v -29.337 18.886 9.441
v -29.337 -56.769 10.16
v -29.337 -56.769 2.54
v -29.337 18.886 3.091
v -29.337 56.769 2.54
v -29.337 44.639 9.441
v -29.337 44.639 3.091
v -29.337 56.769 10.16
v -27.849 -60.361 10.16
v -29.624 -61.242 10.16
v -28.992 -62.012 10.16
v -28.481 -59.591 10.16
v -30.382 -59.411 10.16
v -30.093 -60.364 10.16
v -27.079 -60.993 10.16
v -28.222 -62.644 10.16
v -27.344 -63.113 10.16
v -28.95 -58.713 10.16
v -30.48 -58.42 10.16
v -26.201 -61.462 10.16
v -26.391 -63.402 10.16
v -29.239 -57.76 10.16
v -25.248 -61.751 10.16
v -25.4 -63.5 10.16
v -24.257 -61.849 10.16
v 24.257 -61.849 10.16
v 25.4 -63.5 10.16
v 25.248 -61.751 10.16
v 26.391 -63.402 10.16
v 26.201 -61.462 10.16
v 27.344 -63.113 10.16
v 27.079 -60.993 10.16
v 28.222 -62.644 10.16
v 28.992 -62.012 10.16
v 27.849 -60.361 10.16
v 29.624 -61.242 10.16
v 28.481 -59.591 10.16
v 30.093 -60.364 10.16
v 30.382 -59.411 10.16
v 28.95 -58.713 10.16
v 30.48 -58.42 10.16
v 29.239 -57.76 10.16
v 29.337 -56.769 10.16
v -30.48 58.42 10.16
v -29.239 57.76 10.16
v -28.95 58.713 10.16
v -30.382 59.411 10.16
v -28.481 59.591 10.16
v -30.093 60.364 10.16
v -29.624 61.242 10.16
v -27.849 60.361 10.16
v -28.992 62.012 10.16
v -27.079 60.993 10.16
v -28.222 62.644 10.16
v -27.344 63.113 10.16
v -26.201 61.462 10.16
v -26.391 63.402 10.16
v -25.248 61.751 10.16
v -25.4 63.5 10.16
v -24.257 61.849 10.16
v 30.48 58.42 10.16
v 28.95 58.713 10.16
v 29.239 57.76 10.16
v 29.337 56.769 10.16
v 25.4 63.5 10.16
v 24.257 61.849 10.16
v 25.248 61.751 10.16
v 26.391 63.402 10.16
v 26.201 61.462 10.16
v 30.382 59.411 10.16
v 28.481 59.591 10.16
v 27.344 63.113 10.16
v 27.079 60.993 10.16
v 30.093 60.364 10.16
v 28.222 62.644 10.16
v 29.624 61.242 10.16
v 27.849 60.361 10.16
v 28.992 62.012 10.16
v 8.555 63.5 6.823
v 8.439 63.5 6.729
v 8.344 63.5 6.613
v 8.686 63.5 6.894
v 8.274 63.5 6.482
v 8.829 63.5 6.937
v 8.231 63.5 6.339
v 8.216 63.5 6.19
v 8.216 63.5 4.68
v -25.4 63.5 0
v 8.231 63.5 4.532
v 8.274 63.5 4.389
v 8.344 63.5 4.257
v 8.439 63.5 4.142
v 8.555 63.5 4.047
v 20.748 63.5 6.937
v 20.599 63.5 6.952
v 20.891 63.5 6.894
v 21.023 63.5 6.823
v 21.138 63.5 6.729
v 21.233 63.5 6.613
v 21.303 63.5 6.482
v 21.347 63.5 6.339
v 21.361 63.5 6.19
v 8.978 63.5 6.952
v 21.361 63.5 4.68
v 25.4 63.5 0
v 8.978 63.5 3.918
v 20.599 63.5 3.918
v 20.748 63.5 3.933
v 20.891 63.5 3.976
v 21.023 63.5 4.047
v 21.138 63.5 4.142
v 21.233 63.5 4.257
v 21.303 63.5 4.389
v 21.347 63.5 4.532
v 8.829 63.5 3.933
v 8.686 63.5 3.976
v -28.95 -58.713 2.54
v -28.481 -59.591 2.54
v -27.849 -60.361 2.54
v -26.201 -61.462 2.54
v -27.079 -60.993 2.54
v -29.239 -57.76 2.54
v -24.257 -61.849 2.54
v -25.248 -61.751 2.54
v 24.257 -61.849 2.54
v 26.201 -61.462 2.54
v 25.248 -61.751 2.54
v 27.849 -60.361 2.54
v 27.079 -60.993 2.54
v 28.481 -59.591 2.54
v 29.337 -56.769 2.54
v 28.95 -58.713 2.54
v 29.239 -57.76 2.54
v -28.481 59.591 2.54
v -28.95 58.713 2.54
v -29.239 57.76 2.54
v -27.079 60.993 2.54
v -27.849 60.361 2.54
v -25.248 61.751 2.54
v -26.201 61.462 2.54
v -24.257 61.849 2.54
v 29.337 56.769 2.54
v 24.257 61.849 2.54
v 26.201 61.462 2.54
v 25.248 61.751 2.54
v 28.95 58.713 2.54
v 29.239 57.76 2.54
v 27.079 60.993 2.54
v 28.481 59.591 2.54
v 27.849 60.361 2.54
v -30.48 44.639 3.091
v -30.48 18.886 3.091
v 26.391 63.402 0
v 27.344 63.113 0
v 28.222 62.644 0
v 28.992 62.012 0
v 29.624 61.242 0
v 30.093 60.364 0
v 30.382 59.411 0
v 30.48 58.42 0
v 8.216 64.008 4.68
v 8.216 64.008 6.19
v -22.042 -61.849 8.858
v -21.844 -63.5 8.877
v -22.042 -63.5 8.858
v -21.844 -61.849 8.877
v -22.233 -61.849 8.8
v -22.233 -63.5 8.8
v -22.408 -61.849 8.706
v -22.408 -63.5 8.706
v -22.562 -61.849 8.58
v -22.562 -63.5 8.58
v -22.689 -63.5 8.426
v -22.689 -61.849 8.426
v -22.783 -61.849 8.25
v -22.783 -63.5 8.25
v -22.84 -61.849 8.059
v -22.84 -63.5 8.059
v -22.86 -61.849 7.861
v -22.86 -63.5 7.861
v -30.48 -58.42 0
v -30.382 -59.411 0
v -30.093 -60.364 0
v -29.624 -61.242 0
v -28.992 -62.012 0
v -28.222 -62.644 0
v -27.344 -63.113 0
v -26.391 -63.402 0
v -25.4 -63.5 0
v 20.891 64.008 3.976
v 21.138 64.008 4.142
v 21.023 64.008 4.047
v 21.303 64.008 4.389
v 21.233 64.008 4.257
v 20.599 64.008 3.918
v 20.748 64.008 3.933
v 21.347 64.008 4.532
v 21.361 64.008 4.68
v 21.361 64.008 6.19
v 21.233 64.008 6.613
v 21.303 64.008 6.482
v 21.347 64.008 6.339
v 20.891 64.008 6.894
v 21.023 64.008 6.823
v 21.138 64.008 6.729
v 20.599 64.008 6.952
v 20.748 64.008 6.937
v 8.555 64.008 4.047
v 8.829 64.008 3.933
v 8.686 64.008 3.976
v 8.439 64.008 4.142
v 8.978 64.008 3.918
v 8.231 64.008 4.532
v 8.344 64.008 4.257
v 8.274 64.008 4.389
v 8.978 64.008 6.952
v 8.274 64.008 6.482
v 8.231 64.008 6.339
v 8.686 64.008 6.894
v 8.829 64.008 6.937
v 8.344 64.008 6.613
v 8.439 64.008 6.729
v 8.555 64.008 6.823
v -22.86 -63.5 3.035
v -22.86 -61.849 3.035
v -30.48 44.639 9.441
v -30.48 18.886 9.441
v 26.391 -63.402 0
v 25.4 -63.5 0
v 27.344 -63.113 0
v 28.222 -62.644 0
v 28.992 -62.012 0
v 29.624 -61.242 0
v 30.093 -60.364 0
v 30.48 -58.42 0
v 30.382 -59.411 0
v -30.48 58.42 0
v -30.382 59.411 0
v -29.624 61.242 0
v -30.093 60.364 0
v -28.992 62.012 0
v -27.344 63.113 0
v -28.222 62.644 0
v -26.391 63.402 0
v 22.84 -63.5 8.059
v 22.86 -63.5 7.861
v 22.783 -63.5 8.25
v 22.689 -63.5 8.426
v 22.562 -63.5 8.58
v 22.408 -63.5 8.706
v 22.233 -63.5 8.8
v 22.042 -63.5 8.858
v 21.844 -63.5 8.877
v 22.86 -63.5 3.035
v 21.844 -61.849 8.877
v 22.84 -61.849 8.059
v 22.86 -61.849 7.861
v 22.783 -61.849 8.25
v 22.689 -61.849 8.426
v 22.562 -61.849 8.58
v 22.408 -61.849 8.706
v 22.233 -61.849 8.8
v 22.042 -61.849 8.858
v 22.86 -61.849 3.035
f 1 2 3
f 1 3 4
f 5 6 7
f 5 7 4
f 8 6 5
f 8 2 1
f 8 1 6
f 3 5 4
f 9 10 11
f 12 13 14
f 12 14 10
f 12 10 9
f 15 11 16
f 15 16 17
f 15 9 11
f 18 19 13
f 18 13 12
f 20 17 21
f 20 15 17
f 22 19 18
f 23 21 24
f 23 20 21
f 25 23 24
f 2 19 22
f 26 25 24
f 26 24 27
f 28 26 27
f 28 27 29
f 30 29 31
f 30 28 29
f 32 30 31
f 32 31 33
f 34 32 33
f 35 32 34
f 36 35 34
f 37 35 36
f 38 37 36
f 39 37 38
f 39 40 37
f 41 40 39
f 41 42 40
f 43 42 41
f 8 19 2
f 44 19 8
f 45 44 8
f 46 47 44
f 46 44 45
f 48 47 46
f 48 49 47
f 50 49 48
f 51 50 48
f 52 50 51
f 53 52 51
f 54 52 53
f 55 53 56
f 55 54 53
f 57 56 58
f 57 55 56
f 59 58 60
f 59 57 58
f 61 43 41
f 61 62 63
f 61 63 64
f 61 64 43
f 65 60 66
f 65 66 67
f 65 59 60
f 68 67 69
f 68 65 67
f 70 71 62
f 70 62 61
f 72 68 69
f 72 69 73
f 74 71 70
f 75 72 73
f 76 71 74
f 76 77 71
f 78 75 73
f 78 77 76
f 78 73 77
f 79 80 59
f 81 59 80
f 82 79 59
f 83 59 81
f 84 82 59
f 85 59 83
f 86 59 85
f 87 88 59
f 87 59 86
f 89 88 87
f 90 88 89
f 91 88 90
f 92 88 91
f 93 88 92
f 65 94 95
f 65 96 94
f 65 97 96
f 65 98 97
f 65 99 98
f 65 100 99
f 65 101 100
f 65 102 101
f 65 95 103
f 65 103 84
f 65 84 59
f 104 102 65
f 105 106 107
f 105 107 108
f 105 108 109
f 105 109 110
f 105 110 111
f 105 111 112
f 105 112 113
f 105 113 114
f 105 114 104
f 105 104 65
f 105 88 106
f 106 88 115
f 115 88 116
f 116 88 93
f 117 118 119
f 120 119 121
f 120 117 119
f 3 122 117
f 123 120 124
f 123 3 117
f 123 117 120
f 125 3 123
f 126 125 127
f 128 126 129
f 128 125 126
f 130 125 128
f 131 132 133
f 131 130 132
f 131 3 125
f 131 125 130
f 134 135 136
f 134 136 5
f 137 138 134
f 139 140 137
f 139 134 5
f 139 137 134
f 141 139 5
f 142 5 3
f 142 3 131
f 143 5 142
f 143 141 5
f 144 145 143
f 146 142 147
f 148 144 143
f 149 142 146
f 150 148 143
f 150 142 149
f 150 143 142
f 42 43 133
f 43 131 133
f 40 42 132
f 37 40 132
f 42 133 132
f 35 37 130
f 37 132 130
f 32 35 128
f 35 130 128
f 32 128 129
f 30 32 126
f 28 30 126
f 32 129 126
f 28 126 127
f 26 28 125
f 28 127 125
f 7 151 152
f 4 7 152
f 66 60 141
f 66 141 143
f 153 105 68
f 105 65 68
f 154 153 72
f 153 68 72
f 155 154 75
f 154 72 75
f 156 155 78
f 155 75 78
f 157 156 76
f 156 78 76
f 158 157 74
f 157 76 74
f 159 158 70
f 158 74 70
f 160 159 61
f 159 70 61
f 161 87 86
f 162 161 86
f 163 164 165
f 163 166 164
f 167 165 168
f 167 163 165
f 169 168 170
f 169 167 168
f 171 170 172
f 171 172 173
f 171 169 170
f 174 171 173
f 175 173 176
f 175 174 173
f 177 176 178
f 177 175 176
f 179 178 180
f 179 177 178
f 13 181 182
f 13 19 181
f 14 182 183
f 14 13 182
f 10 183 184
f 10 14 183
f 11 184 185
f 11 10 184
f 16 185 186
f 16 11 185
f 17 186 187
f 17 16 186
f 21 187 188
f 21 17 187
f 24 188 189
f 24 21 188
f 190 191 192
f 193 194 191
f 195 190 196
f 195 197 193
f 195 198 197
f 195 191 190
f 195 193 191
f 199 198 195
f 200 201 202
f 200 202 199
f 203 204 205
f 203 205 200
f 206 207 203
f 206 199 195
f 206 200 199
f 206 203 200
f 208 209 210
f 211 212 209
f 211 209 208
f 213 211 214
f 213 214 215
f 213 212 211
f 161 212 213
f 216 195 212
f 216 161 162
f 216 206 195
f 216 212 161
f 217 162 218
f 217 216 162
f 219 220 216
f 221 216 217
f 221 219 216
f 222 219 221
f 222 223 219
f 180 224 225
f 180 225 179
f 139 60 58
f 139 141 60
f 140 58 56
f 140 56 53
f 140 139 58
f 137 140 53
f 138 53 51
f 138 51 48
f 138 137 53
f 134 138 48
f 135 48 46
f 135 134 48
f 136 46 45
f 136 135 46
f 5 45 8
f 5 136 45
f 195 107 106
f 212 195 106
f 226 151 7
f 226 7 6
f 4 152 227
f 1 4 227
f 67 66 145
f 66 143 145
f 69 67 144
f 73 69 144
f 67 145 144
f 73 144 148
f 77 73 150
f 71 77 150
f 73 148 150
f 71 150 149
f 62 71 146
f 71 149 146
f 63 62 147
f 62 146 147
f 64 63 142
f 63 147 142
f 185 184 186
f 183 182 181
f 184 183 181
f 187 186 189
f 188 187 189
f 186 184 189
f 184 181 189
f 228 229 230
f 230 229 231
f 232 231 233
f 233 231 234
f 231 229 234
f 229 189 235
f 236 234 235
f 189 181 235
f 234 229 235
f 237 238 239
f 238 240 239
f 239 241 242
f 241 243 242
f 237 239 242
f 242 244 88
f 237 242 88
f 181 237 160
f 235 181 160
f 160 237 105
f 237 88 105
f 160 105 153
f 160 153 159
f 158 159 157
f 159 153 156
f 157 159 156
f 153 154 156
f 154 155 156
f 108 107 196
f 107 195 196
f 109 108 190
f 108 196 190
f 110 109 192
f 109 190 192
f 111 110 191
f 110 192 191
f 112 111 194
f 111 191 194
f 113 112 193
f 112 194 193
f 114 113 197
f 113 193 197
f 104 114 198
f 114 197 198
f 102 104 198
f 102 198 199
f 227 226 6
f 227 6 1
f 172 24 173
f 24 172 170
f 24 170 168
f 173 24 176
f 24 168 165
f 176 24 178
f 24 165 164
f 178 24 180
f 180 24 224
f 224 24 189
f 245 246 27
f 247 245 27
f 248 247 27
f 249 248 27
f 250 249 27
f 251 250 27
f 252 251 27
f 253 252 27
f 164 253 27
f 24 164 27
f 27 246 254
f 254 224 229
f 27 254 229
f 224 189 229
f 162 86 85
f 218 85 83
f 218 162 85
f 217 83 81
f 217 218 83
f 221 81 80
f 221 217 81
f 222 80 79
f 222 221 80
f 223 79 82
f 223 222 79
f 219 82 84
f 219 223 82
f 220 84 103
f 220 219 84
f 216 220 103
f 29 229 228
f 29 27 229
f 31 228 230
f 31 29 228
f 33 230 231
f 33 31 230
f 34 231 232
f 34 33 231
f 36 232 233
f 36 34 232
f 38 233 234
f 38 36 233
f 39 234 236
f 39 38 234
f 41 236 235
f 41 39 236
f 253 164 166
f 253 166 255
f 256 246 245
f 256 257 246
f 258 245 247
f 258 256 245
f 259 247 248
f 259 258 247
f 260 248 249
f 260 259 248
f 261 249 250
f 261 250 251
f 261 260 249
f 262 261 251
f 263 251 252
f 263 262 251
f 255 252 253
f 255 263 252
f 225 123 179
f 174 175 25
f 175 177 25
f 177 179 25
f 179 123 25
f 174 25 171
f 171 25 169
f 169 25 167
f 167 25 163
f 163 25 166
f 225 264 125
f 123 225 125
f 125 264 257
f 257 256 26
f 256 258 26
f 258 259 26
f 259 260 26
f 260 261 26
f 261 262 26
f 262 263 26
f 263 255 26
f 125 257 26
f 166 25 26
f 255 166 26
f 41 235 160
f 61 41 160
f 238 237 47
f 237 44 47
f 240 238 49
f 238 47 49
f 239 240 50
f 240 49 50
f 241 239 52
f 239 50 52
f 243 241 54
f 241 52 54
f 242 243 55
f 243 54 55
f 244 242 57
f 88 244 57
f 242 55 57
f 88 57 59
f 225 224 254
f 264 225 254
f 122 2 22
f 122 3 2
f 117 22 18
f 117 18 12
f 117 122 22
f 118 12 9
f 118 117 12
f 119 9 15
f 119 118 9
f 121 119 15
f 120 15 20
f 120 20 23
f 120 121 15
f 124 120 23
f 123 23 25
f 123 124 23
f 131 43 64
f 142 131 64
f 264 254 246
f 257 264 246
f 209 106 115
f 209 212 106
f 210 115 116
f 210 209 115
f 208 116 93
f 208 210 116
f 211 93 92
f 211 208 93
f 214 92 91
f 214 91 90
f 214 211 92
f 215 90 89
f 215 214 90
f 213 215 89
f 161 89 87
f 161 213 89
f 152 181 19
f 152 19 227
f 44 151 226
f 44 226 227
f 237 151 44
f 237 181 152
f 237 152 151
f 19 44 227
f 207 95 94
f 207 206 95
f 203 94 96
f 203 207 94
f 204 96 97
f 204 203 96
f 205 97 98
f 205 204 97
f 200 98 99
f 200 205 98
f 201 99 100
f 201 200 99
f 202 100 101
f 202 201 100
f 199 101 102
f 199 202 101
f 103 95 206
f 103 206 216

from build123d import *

# Parameters (mm, degrees)
F0_W      = 60.96
F0_H      = 127
F1_DEPTH  = 10.16
F2_W      = 58.674
F2_H      = 123.698
F3_DEPTH  = 7.62
F4_R      = 5.08
F5_R      = 5.08
F6_W      = 45.72
F6_H      = 5.842
F7_DEPTH  = 25.4
F8_R      = 1.016
F9_W      = 25.752777
F9_H      = 6.35
F10_DEPTH = 25.4
F11_W     = 13.145404
F11_H     = 3.033555
F12_DEPTH = 0.508
F13_R     = 0.762


with BuildPart() as f1:
    # F0 (on Top) → F1 (new body)
    with BuildSketch(Plane.XY):
        Rectangle(F0_W, F0_H)
    extrude(amount=F1_DEPTH)

    # F2 (on face) → F3 (cut)
    with BuildSketch(Plane.XY.offset(10.16)):
        Rectangle(F2_W, F2_H)
    extrude(amount=-F3_DEPTH, mode=Mode.SUBTRACT)

    # F4
    f4_edges = [f1.edges().sort_by_distance(p)[0] for p in [
        (-29.337, 61.849, 6.35),
    ]]
    fillet(f4_edges, radius=F4_R)

    # F5
    f5_edges = [f1.edges().sort_by_distance(p)[0] for p in [
        (29.337, 61.849, 6.35),
        (29.337, -61.849, 6.35),
        (-29.337, -61.849, 6.35),
        (30.48, 63.5, 5.08),
        (-30.48, 63.5, 5.08),
        (-30.48, -63.5, 5.08),
        (30.48, -63.5, 5.08),
    ]]
    fillet(f5_edges, radius=F5_R)

    # F6 (on face) → F7 (cut)
    with BuildSketch(Plane.XZ.offset(63.5)):
        with Locations((0, 5.956087)):
            Rectangle(F6_W, F6_H)
    extrude(amount=-F7_DEPTH, mode=Mode.SUBTRACT)

    # F8
    f8_edges = [f1.edges().sort_by_distance(p)[0] for p in [
        (-22.86, -62.6745, 8.877087),
        (22.86, -62.6745, 8.877087),
    ]]
    fillet(f8_edges, radius=F8_R)

    # F9 (on face) → F10 (cut)
    with BuildSketch(Plane(origin=(-30.48, 0, 0), x_dir=(0, -1, 0), z_dir=(-1, 0, 0))):
        with Locations((-31.762417, 6.265609)):
            Rectangle(F9_W, F9_H)
    extrude(amount=-F10_DEPTH, mode=Mode.SUBTRACT)

    # F11 (on face) → F12 (join)
    with BuildSketch(Plane(origin=(0, 63.5, 0), x_dir=(-1, 0, 0), z_dir=(0, 1, 0))):
        with Locations((-14.788578, 5.435118)):
            Rectangle(F11_W, F11_H)
    extrude(amount=F12_DEPTH)

    # F13
    f13_edges = [f1.edges().sort_by_distance(p)[0] for p in [
        (8.215876, 63.754, 3.918341),
        (8.215876, 63.754, 6.951896),
        (21.36128, 63.754, 3.918341),
        (21.36128, 63.754, 6.951896),
    ]]
    fillet(f13_edges, radius=F13_R)


solid = f1.part
